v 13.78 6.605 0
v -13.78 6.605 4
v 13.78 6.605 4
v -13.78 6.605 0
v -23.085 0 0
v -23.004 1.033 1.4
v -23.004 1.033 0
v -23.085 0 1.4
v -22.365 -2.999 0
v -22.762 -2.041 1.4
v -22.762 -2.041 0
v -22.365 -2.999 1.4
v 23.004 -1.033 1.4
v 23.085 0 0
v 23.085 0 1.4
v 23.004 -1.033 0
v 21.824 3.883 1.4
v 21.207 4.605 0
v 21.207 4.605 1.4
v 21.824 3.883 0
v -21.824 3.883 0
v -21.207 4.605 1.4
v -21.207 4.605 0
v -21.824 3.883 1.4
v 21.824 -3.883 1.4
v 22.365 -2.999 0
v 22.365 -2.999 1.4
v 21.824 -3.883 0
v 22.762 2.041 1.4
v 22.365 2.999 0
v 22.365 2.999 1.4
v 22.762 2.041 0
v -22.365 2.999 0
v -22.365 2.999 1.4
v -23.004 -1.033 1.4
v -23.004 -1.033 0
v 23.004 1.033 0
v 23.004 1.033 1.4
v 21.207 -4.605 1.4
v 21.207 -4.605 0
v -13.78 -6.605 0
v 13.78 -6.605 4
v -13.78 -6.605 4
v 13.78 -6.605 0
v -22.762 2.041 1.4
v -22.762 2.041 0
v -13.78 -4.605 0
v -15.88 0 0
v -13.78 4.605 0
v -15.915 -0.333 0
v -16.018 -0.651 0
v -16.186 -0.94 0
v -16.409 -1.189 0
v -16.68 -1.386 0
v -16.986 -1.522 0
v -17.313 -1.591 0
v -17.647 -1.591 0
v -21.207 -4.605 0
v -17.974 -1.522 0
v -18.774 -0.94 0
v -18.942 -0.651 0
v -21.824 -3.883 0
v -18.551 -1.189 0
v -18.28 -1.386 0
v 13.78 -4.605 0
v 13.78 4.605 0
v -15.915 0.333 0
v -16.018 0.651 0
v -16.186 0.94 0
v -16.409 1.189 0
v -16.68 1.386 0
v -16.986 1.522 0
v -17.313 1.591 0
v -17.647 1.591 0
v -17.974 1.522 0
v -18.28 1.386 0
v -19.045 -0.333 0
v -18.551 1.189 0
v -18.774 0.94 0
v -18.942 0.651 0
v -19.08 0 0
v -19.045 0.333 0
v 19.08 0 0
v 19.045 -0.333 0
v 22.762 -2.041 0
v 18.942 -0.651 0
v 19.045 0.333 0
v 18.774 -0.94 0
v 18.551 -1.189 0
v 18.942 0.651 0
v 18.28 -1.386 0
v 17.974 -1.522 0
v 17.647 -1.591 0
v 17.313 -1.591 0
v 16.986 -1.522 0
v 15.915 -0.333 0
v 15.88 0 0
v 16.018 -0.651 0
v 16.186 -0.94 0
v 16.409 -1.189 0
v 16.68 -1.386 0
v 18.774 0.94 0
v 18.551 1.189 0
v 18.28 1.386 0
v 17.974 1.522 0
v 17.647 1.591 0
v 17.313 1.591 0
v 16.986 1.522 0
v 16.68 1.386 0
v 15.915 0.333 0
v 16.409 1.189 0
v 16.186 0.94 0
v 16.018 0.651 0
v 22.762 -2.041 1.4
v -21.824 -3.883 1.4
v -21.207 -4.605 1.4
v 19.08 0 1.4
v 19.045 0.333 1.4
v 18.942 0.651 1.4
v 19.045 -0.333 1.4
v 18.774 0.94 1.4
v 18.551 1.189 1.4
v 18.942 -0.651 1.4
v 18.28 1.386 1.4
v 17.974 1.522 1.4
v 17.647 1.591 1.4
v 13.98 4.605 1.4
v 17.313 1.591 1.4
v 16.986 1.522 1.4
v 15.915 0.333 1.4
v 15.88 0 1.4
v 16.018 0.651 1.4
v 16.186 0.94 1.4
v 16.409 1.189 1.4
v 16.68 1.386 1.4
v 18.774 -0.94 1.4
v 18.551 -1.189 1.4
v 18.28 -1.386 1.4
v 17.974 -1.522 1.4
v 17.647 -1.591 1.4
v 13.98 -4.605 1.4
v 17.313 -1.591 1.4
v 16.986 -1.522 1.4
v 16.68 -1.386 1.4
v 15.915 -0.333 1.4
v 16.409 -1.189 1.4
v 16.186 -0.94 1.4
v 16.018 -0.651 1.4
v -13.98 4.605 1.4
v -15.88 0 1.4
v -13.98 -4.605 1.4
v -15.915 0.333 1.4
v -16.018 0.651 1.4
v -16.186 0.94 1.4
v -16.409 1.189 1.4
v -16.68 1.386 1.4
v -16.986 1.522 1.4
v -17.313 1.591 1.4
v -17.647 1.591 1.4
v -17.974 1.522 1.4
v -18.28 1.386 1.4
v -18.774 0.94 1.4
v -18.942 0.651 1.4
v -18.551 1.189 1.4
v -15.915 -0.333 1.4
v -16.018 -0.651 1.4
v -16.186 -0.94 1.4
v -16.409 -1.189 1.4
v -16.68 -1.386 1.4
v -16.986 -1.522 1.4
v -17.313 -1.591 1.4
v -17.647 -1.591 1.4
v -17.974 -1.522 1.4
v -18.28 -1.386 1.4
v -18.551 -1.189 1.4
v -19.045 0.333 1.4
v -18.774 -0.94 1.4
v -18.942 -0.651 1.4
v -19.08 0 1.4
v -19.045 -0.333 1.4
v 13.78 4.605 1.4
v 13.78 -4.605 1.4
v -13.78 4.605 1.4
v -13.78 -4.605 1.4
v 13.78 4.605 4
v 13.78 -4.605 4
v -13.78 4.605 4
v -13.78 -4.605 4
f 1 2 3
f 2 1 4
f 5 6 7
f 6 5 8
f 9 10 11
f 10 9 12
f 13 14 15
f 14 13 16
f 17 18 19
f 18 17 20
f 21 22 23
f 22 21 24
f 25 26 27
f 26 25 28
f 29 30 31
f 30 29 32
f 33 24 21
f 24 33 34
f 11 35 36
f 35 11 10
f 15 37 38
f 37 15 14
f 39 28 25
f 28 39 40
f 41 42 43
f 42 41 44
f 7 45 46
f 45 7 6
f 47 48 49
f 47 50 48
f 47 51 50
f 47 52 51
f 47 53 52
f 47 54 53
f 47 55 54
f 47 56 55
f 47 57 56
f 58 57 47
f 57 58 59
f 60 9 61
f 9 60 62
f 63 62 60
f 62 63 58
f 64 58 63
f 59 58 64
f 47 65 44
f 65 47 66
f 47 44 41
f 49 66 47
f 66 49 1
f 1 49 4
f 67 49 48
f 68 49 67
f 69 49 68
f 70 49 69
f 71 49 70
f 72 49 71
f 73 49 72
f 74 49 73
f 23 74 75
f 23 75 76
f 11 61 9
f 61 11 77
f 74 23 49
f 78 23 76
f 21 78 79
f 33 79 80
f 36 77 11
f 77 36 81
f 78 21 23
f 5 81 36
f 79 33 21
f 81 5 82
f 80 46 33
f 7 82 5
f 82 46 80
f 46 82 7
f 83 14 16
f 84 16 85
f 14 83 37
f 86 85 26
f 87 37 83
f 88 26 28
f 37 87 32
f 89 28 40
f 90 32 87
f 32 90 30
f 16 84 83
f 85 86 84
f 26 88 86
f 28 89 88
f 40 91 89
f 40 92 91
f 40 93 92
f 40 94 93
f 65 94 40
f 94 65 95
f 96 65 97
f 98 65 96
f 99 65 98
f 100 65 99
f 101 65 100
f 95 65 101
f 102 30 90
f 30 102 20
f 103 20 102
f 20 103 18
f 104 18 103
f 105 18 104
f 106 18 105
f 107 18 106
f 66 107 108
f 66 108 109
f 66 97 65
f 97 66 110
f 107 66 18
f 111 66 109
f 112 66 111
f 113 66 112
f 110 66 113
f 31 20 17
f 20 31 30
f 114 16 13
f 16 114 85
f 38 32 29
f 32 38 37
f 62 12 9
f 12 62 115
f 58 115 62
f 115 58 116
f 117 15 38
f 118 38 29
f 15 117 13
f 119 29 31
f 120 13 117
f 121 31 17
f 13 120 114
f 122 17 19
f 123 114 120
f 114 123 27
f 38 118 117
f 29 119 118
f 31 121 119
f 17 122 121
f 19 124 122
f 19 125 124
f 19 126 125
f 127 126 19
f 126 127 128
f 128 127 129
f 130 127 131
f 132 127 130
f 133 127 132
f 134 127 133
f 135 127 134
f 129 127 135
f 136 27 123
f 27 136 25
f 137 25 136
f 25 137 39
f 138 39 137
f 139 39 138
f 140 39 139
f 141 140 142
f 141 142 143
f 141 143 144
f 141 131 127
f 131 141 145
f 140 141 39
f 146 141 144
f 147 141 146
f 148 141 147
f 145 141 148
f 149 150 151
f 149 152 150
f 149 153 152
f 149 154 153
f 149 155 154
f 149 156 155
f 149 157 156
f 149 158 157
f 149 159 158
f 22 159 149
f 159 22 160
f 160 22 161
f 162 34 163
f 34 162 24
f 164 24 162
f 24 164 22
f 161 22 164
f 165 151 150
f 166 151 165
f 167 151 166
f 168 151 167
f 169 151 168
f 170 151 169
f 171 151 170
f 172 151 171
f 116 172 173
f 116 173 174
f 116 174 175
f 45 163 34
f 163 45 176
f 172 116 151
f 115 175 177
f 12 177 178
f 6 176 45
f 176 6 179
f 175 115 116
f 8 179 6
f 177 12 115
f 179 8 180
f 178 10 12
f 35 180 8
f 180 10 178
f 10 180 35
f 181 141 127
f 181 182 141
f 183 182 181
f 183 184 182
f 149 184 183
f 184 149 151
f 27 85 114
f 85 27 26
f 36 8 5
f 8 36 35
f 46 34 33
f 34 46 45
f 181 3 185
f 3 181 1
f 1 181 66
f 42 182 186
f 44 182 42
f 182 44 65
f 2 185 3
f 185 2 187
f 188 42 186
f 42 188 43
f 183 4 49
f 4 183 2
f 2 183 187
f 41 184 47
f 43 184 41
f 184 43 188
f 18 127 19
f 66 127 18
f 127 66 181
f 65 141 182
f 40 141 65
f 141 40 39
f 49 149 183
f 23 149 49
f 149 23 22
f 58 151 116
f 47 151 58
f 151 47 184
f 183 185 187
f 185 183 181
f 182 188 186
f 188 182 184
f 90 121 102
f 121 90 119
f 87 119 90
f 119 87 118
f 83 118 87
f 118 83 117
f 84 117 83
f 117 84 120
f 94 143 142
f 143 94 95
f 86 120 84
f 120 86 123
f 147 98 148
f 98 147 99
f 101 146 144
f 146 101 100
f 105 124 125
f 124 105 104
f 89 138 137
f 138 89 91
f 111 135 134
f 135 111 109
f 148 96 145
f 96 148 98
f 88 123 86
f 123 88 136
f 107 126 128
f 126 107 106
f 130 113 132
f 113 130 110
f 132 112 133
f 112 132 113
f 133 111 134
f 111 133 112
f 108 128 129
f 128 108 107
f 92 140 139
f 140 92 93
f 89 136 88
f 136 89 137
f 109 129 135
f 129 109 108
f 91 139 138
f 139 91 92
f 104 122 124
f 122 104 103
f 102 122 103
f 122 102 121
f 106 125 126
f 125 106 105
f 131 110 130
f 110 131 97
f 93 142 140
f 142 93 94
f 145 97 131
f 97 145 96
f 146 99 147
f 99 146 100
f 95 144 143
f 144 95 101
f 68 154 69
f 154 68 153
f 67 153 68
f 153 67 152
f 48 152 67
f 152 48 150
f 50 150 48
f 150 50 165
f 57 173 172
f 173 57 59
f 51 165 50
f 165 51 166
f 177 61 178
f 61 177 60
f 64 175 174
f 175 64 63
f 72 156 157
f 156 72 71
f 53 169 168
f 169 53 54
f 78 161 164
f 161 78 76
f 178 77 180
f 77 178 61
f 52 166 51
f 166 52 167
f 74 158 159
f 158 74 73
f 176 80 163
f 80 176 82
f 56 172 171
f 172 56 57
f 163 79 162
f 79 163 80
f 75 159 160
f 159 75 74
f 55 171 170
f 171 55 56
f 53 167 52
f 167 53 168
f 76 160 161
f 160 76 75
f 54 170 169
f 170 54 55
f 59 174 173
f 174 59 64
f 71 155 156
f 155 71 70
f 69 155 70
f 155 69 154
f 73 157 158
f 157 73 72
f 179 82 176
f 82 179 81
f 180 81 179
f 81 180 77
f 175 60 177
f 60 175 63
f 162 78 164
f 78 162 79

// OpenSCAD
// file: ../PCParts/common.scad
atx_psu_width = 150;
atx_psu_height = 86;

card_spacing = 20.32;

fan_connector_width = 6.1;
fan_connector_length = 7.9;

fan_92mm = 92;
fan_92mm_bolt_offset = 82.5/2;

module mock_mobo() {
    $fn=50;
    difference() {
        cube([304.8, 243.84, 2]);
        translate([6.35+281.94,10.16,0]) cylinder(d=4, h=3);
        translate([6.35+281.94,10.16+154.94,0]) cylinder(d=4, h=3);
        translate([6.35+281.94,10.16+227.33,0]) cylinder(d=4, h=3);

        translate([6.35+157.48+45.72,10,0]) cylinder(d=4, h=3);

        translate([6.35+157.48,10.16,0]) cylinder(d=4, h=3);
        translate([6.35+157.48,10.16+154.94,0]) cylinder(d=4, h=3);
        translate([6.35+157.48,10.16+227.33,0]) cylinder(d=4, h=3);

        translate([6.35,22.86,0]) cylinder(d=4, h=3);
        translate([6.35,10.16+154.94,0]) cylinder(d=4, h=3);
        translate([6.35,10.16+227.33,0]) cylinder(d=4, h=3);
    }
}

module mock_card() {
    $fn=50;
    cube([200, 2, 106.7]);
    translate([-12.3, -15.8+22-19.4, -18.8+119.2]) difference() {
        cube([12.3,19.4,1]);
        translate([6.3, 19.4-1-4.8/2,0]) hull() {
            cylinder(d=4.8,h=2, $fn=40);
            translate([0,5,0]) cylinder(d=4.8,h=2, $fn=40);
        }
    }
    difference() {
        translate([-1,-15.8, -18.8]) cube([1,22, 120.2]);
        translate([-1.3,-15.8, -18.8]) cube([2,(18.8-10.6)/2, 11.2]);
        translate([-1.3,-15.8+10.6+(18.8-10.6)/2, -18.8]) cube([2,(18.8-10.6)/2, 11.2]);
        translate([-1.3,-15.8+18.8, -18.8]) cube([2,5, 116.2]);
        translate([-1.3,-15.8, -18.8+116.2]) cube([2,22-18.8, 5]);
    }
    
}

module mock_mobo_card() {
    
    mock_mobo();
    translate([304.8-142,-1.2,18.8-10.4]) rotate([0,0,90]) mock_card();
    translate([304.8-142+card_spacing,-1.2,18.8-10.4]) rotate([0,0,90]) mock_card();
    translate([304.8-142+2*card_spacing,-1.2,18.8-10.4]) rotate([0,0,90]) mock_card();
    translate([304.8-142+3*card_spacing,-1.2,18.8-10.4]) rotate([0,0,90]) mock_card();
    translate([304.8-142+4*card_spacing,-1.2,18.8-10.4]) rotate([0,0,90]) mock_card();
    translate([304.8-142+5*card_spacing,-1.2,18.8-10.4]) rotate([0,0,90]) mock_card();
    translate([304.8-142+6*card_spacing,-1.2,18.8-10.4]) rotate([0,0,90]) mock_card();
}

module mock_ssd() {
    difference() {
        cube([70, 100, 7.1]);
        translate([9.4,0,6.5]) cube([41.4,7,1]);
        translate([10.4,0,0]) cube([39.4,7,2]);
    }
    translate([0,13.6,3]) rotate([0,-90,0]) cylinder(d=2.5, h=5, $fn=30);
    translate([0,100-9.2,3]) rotate([0,-90,0]) cylinder(d=2.5, h=5, $fn=30);

    translate([70+5,13.6,3]) rotate([0,-90,0]) cylinder(d=2.5, h=5, $fn=30);
    translate([70+5,100-9.2,3]) rotate([0,-90,0]) cylinder(d=2.5, h=5, $fn=30);

}


hd_width = 102;
hd_height = 26.1;

screw_dia = 3.6;

module mock_hd() {
    color("white") difference() {
        cube([hd_width,146,26]);
        translate([0,28.3,6.40]) rotate([0,90,0]) cylinder(d=screw_dia, h=5, $fn=30);
        translate([0,69.8,6.40]) rotate([0,90,0]) cylinder(d=screw_dia, h=5, $fn=30);
        translate([0,129.8,6.40]) rotate([0,90,0]) cylinder(d=screw_dia, h=5, $fn=30);

        translate([hd_width-5,28.3,6.40]) rotate([0,90,0]) cylinder(d=screw_dia, h=5, $fn=30);
        translate([hd_width-5,69.8,6.40]) rotate([0,90,0]) cylinder(d=screw_dia, h=5, $fn=30);
        translate([hd_width-5,129.8,6.40]) rotate([0,90,0]) cylinder(d=screw_dia, h=5, $fn=30);

    }
        
}

module minus_atx_psu_holes(hole=3.2) {
    difference() {
        children();
        translate([-138/2,0,6]) rotate([-90,0,0]) cylinder(d=hole, h=5, $fn=30);
        translate([138/2,0,6]) rotate([-90,0,0]) cylinder(d=hole, h=5, $fn=30);
        translate([138/2,0,6+64]) rotate([-90,0,0]) cylinder(d=hole, h=5, $fn=30);
        translate([-150/2+30,0,atx_psu_height-6]) rotate([-90,0,0]) cylinder(d=hole, h=5, $fn=30);
    }
}

module mock_atx_psu(holes=true, slop=0) {
    w = atx_psu_width+2*slop;
    h = atx_psu_height+2*slop;
    if (holes) {
        minus_atx_psu_holes() {
            translate([-w/2,0,0]) cube([w, 140, h]);
        }
    } else {
        translate([-w/2,0,0]) cube([w, 140, h]);
    }
}


module mock_fan_connector_male(slop=0.2) {
    
    module pin() {
        color("grey") cube([0.75,0.75,14.3],center=true);
    }
    
    w = fan_connector_width + slop;
    l = fan_connector_length + slop;
    
    pin_offset = (5.8-0.75)/2;
    union() {
        color("white") {
            translate([0,0,3.2/2]) cube([w, l,3.2], center=true);
            translate([-w/2+0.9/2,0,3.2+8.5/2]) cube([0.9,5,8.5],center=true);
            translate([-w/2+0.9+0.3/2,0,1.7/2+5.7]) cube([0.3,5,1.7],center=true);
        }
        
        translate([-w/2+2.4,0,14.3/2-3.6]) pin();
        translate([-w/2+2.4,pin_offset,14.3/2-3.6]) pin();
        translate([-w/2+2.4,-pin_offset,14.3/2-3.6]) pin();
    }
}


//mock_mobo();
//mock_card();
//mock_mobo_card();
//mock_ssd();
//mock_atx_psu();
//mock_fan_connector_male();
// main file
include <../PCParts/common.scad>;

// pcb size
l = 4.02 * 2.54;


row1_x = 0.8 + 2.54 * 2;
row1_y = 2.54 * 2;
    
spacing = 2.54 * 3;


//debug();
//mock_connector_pcb(3);

//fan_connector_mount(3);
fan_connector_mount_bottom(3);

//fan_connector_mount(5);
//fan_connector_mount_bottom(5);

function pcb_w(connectors) = 
    connectors * spacing + 5.1;


module debug() {
    intersection() {
        fan_connector_mount(3);

        translate([0, 50/2 + 1, 0])
        cube([100, 50, 30], center=true);
    }

    translate([0, 0, 7.7])
    rotate([180, 0, 0])
    fan_connector_mount_bottom(3);
}


module mock_connector_pcb(connectors=5) {

    w = pcb_w(connectors);
    echo(w);
    
    union() {
        pcb_with_holes(w, l, h=1.6);

        for (i = [0:connectors - 1]) {
            translate([
                row1_x + i*spacing,
                row1_y, 1.78
            ])
            mock_fan_connector_male();

        }
    }
}

module fan_connector_mount(connectors=5) {

    w = pcb_w(connectors);

    difference() {

        hull() {
            translate([-(w + 5)/2, 0, 0])
            cylinder(d=l + 3, h=7.6, $fn=40);

            translate([(w + 5)/2, 0, 0])
            cylinder(d=l + 3, h=7.6, $fn=40);
        }

        // pcb hole
        translate([0, 0, 2 + 13/2])
        cube([w, l, 13], center=true);

        // cover holes
        translate([0, 0, 6.2 + 3/2])
        cube([w + 30, l - 0.8, 3], center=true);

        translate([0, 0, 10/2 + 3.6])
        cube([w, 20, 10], center=true);

        // fan connector holes
        for (i = [0:connectors - 1]) {
            translate([
                -w/2 + row1_x + i * spacing,
                0, -0.1
            ])
            scale([1.05, 1.04, 1])
            mock_fan_connector_male();
        }

        // mount holes
        translate([(w + 5)/2 + 1, 0, 0])
        cylinder(d=3.2, h=15, center=true, $fn=30);

        translate([-(w + 5)/2 - 1, 0, 0])
        cylinder(d=3.2, h=30, center=true, $fn=30);

        // cable holes
        translate([-w/2 - 3, l/2 - 1.4, 3.6 + 7/2])
        cube([13, 2, 7], center=true);

        translate([-w/2 - 3, -l/2 + 1.4, 3.6 + 7/2])
        cube([13, 2, 7], center=true);
    }
    %translate([-w/2, l/2, 3.6])
    rotate([180, 0, 0])
    mock_connector_pcb(connectors);
}

module fan_connector_mount_bottom(connectors=5) {

    w = pcb_w(connectors);

    difference() {
        union() {
            hull() {
                translate([-(w + 5)/2, 0, 0])
                cylinder(d=l + 3, h=1.4, $fn=40);

                translate([(w + 5)/2, 0, 0])
                cylinder(d=l + 3, h=1.4, $fn=40);

            }
            translate([0, 0, 4/2])
            cube([w - 0.4, l + 3, 4], center=true);
        }

        translate([w/2 + 20/2 - 0.2, l/2 - 0.5 + 4/2])
        cube([20, 4, 8], center=true);

        translate([w/2 + 20/2 - 0.2, -l/2 + 0.5 - 4/2])
        cube([20, 4, 8], center=true);

        translate([-w/2 - 20/2 + 0.2, l/2 - 0.5 + 4/2])
        cube([20, 4, 8], center=true);

        translate([-w/2 - 20/2 + 0.2, -l/2 + 0.5 - 4/2])
        cube([20, 4, 8], center=true);

        translate([0, 0, 1.4 + 13/2])
        cube([w, l - 1, 13], center=true);

        translate([(w + 5)/2 + 1, 0, 0])
        cylinder(d=3.2, h=15, center=true, $fn=30);

        translate([-(w + 5)/2 - 1, 0, 0])
        cylinder(d=3.2, h=30, center=true, $fn=30);
    }
}
